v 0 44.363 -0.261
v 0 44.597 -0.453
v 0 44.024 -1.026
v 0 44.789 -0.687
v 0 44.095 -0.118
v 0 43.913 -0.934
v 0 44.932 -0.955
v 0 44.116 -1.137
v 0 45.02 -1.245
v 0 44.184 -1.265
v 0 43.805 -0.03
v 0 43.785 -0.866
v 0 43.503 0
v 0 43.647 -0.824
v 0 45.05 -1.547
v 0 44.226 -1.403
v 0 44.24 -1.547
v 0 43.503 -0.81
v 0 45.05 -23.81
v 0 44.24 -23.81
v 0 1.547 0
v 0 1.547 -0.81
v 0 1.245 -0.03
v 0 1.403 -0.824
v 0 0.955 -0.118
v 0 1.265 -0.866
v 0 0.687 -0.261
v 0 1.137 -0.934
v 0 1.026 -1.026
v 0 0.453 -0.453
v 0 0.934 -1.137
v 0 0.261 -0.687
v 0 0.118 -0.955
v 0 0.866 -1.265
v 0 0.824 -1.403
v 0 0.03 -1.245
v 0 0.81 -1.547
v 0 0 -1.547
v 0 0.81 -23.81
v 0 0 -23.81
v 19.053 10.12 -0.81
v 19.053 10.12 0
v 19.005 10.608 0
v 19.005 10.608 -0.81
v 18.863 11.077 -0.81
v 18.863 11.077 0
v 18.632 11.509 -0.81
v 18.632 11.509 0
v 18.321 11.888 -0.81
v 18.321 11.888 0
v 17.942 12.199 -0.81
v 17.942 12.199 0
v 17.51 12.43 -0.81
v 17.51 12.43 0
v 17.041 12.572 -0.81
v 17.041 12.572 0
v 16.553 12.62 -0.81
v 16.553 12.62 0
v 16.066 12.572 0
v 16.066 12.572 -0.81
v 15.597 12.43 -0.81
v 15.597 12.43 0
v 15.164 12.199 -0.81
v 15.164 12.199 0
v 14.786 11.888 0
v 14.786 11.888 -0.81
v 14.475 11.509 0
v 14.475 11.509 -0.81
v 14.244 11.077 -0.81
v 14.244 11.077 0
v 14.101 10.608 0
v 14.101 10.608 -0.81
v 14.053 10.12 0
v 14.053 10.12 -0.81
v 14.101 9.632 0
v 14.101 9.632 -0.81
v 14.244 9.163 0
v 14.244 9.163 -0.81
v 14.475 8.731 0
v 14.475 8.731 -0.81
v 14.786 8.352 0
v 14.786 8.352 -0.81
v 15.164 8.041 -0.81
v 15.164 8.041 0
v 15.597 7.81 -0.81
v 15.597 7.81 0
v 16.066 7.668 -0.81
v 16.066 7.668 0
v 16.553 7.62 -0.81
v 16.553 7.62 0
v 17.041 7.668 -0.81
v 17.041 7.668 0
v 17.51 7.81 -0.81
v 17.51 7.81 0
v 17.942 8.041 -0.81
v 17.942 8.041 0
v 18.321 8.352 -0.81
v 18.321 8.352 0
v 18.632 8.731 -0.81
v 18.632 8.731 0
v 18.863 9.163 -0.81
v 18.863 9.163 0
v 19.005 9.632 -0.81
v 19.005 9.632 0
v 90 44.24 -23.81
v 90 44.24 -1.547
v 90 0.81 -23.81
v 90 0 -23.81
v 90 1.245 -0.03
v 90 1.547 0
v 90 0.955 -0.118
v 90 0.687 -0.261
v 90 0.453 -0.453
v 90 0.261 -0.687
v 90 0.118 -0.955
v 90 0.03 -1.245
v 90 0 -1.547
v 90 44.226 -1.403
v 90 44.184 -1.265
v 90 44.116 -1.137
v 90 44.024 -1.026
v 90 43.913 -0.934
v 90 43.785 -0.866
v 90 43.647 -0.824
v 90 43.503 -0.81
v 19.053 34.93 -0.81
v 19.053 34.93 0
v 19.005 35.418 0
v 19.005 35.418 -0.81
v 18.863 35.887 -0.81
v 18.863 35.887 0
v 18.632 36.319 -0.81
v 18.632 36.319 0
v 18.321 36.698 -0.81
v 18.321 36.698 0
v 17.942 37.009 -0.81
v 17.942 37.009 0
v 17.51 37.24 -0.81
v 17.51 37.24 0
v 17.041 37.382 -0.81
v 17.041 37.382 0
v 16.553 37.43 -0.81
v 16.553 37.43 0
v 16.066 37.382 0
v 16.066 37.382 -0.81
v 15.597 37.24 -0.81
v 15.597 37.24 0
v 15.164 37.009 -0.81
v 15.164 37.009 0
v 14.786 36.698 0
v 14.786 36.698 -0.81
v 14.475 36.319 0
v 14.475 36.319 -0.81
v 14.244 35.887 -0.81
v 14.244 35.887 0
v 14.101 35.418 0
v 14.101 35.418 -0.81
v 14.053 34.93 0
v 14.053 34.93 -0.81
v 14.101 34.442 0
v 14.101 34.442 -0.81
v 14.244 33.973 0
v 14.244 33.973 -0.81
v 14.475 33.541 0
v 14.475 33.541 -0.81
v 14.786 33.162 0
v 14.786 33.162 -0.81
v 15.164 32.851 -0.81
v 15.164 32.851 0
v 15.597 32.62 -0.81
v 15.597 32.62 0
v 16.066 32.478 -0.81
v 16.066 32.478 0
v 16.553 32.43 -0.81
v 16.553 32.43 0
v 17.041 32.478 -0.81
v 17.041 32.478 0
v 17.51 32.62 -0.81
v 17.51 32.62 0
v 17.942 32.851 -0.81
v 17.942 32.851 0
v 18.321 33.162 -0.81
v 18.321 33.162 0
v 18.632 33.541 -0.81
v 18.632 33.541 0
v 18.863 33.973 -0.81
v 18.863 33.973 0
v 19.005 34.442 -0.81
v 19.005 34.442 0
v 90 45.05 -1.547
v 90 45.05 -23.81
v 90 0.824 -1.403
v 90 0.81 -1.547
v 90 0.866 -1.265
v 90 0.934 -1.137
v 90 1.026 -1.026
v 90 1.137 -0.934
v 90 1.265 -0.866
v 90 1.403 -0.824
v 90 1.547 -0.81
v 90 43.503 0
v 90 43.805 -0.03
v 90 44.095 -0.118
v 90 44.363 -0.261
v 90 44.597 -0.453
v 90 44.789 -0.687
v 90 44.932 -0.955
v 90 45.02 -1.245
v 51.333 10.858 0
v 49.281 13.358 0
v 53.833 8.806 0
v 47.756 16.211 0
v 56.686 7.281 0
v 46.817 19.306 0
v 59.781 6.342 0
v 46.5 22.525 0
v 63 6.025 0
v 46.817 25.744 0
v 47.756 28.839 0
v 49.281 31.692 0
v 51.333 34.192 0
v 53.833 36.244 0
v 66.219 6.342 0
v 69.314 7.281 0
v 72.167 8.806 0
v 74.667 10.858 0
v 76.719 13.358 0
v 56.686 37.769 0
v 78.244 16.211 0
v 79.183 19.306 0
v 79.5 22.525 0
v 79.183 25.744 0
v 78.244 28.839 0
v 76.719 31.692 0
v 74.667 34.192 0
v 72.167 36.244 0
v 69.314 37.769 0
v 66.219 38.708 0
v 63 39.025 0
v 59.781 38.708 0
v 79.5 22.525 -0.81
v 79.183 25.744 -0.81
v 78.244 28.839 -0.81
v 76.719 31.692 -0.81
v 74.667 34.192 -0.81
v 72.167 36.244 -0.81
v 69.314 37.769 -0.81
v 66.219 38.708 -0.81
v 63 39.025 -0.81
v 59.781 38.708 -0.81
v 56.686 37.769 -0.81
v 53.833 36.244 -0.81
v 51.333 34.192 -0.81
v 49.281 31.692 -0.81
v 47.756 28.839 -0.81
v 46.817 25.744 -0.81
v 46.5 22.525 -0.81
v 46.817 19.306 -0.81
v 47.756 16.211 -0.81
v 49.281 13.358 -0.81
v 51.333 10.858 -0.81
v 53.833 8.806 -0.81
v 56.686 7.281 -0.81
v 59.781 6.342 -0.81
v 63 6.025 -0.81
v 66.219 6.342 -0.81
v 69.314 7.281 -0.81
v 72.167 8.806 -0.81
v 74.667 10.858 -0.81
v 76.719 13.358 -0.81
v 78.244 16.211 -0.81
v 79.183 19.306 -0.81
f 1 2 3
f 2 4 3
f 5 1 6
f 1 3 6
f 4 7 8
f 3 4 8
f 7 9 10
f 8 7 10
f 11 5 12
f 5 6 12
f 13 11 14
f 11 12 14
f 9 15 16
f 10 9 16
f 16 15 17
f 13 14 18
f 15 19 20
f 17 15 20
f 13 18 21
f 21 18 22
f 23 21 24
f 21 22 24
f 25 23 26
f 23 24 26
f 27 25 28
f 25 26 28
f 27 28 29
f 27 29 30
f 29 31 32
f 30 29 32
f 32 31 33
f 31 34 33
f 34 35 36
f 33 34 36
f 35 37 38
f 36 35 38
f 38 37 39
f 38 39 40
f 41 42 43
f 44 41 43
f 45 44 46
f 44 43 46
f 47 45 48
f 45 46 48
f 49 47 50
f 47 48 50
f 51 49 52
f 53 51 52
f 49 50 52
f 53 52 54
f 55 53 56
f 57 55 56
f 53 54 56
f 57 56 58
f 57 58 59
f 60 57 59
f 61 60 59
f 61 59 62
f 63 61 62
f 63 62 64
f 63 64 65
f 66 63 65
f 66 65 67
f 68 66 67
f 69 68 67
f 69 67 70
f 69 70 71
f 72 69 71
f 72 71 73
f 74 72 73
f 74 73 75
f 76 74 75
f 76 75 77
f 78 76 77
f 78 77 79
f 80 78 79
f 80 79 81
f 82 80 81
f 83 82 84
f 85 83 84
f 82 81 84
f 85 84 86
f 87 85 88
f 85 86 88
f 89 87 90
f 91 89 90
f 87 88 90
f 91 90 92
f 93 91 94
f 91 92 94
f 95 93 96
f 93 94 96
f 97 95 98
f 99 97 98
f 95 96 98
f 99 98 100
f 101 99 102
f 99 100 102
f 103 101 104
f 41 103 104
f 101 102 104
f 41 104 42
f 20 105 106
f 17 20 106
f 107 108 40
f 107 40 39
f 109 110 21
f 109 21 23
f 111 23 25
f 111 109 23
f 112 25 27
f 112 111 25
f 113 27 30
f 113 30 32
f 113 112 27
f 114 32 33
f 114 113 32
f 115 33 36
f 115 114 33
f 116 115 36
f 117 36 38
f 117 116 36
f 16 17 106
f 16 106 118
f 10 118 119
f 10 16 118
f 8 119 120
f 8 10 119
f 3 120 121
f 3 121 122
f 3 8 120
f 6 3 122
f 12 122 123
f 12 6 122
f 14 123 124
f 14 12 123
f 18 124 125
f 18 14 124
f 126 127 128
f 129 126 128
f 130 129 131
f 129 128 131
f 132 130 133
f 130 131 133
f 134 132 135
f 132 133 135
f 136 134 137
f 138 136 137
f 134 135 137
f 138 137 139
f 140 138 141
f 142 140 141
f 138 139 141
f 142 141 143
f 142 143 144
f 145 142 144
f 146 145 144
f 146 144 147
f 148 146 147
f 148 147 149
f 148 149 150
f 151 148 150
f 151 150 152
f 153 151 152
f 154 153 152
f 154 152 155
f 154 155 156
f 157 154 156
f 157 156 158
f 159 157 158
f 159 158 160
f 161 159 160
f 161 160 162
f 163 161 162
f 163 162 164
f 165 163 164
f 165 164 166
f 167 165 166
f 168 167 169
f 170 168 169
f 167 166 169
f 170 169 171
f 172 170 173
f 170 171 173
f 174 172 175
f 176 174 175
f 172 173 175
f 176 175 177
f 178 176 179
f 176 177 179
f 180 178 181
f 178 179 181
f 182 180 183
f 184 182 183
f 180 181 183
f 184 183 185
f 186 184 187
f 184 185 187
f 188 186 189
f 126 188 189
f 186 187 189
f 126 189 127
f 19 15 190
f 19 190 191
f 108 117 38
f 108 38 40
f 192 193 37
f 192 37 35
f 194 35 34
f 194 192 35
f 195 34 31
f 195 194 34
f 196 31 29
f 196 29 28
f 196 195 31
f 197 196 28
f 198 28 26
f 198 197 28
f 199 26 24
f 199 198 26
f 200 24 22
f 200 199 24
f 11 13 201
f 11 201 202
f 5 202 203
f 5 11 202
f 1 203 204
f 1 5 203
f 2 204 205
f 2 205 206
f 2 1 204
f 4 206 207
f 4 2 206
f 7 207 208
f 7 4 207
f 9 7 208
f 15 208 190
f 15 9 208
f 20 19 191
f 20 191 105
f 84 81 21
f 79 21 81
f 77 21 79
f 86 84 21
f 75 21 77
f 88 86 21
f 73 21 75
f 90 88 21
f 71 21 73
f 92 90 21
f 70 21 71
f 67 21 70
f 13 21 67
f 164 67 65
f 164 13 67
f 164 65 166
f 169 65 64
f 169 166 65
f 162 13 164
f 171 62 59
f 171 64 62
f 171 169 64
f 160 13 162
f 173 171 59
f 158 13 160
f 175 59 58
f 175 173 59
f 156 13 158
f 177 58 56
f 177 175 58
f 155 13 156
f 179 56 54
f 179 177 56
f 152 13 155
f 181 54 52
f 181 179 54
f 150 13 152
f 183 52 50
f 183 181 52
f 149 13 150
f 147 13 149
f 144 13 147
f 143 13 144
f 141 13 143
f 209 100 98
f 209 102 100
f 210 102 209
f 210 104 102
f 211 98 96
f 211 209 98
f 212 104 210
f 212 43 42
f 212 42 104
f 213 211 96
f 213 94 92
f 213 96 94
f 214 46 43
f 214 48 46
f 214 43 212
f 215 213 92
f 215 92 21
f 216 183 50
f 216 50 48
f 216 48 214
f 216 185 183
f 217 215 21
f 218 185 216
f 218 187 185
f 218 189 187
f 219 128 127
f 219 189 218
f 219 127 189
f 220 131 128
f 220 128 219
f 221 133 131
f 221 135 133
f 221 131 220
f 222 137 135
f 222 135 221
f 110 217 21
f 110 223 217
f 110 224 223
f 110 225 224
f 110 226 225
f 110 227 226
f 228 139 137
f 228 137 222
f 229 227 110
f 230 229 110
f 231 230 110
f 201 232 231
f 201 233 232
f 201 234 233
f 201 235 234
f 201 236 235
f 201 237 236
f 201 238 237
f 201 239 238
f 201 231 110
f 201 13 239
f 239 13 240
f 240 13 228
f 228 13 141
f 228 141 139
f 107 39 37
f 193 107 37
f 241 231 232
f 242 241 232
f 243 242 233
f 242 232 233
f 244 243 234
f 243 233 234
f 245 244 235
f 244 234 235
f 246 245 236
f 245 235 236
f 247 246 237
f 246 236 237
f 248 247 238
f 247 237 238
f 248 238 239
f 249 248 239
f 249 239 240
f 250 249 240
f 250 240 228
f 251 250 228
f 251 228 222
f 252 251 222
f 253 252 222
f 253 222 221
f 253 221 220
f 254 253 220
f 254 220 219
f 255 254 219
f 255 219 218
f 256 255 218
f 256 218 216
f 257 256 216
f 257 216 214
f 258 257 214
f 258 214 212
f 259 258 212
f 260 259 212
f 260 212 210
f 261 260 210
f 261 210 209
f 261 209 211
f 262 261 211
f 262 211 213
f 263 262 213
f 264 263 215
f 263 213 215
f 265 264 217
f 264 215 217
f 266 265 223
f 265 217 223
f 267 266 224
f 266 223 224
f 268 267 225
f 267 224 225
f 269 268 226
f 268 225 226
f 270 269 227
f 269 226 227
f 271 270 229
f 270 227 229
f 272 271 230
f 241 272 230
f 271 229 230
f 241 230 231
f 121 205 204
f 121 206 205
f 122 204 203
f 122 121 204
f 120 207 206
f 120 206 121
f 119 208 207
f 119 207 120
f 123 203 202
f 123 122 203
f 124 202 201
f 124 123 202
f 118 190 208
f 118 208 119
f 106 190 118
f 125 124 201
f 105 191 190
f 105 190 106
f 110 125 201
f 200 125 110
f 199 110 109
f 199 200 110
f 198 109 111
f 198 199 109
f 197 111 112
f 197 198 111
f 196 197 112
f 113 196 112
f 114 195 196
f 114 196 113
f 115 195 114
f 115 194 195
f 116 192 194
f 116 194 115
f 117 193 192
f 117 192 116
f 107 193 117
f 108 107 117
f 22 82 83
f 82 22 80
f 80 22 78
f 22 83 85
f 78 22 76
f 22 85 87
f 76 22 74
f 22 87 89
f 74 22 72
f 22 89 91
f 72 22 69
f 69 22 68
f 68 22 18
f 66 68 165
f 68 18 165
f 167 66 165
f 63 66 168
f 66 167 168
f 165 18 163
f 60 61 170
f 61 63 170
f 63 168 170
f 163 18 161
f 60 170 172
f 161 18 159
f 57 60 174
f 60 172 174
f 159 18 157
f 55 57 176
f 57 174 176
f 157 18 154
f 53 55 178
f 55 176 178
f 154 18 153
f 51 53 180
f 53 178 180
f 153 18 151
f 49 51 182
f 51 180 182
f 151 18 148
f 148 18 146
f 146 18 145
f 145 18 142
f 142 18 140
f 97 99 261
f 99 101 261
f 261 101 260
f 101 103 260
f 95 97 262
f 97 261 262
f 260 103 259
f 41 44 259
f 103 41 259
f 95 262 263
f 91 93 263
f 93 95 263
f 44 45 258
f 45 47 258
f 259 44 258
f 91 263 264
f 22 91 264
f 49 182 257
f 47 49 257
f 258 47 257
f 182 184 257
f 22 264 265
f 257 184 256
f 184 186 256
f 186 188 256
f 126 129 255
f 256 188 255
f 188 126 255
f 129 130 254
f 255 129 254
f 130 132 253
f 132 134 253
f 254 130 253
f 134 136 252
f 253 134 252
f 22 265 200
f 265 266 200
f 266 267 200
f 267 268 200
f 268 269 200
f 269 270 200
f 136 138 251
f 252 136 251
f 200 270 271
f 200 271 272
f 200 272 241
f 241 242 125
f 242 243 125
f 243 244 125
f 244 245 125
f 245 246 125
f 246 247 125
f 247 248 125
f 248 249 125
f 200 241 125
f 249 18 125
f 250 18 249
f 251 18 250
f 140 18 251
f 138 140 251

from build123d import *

# Parameters (mm, degrees)
SKETCH1_W                    = 90
SKETCH1_H                    = 45.05
BASE_FLANGE1_DEPTH           = 0.81
EDGE_FLANGE1_STRIP_W         = 4.7132
EDGE_FLANGE1_STRIP_H         = 0.81
EDGE_FLANGE1_STRIP_CUT_DEPTH = 90
EDGE_FLANGE1_DEPTH           = 90
EDGE_FLANGE2_STRIP_W         = 4.7132
EDGE_FLANGE2_STRIP_H         = 0.81
EDGE_FLANGE2_STRIP_CUT_DEPTH = 90
EDGE_FLANGE2_DEPTH           = 90
SKETCH9_R                    = 16.5
SKETCH9_R_2                  = 2.5
CUT_EXTRUDE1_DEPTH           = 10


# Sheet-metal steps are written as plain solids
with BuildPart() as part:
    # Sketch1 → Base-Flange1 (new body)
    with BuildSketch(Plane.XY):
        with Locations((45, 22.525)):
            Rectangle(SKETCH1_W, SKETCH1_H)
    extrude(amount=-BASE_FLANGE1_DEPTH)

    # Edge-Flange1 strip (across the edge) → Edge-Flange1 strip cut (cut)
    with BuildSketch(Plane(origin=(0, 45.05, -0.81), x_dir=(0, -1, 0), z_dir=(1, 0, 0))):
        with Locations((-0.81, -0.405)):
            Rectangle(EDGE_FLANGE1_STRIP_W, EDGE_FLANGE1_STRIP_H)
    extrude(amount=EDGE_FLANGE1_STRIP_CUT_DEPTH, mode=Mode.SUBTRACT)

    # Edge-Flange1 section (across the edge) → Edge-Flange1 (add)
    with BuildSketch(Plane(origin=(0, 45.05, -0.81), x_dir=(0, -1, 0), z_dir=(1, 0, 0))):
        with BuildLine():
            Line((0, 0.7366), (0, 23))
            Line((0, 23), (0.81, 23))
            Line((0.81, 23), (0.81, 0.7366))
            ThreePointArc((0.81, 0.7366), (1.025745145, 0.215745145), (1.5466, 0))
            Line((1.5466, 0), (1.5466, -0.81))
            ThreePointArc((1.5466, -0.81), (0.452988652, -0.357011348), (0, 0.7366))
        make_face()
    extrude(amount=EDGE_FLANGE1_DEPTH)

    # Edge-Flange2 strip (across the edge) → Edge-Flange2 strip cut (cut)
    with BuildSketch(Plane(origin=(90, 0, -0.81), x_dir=(0, 1, 0), z_dir=(-1, 0, 0))):
        with Locations((-0.81, -0.405)):
            Rectangle(EDGE_FLANGE2_STRIP_W, EDGE_FLANGE2_STRIP_H)
    extrude(amount=EDGE_FLANGE2_STRIP_CUT_DEPTH, mode=Mode.SUBTRACT)

    # Edge-Flange2 section (across the edge) → Edge-Flange2 (add)
    with BuildSketch(Plane(origin=(90, 0, -0.81), x_dir=(0, 1, 0), z_dir=(-1, 0, 0))):
        with BuildLine():
            Line((0, 0.7366), (0, 23))
            Line((0, 23), (0.81, 23))
            Line((0.81, 23), (0.81, 0.7366))
            ThreePointArc((0.81, 0.7366), (1.025745145, 0.215745145), (1.5466, 0))
            Line((1.5466, 0), (1.5466, -0.81))
            ThreePointArc((1.5466, -0.81), (0.452988652, -0.357011348), (0, 0.7366))
        make_face()
    extrude(amount=EDGE_FLANGE2_DEPTH)

    # Sketch9 → Cut-Extrude1 (cut)
    with BuildSketch(Plane.XY):
        with Locations((63, 22.525)):
            Circle(SKETCH9_R)
        with Locations((16.55327865, 10.12)):
            Circle(SKETCH9_R_2)
        with Locations((16.55327865, 34.93)):
            Circle(SKETCH9_R_2)
    extrude(amount=-CUT_EXTRUDE1_DEPTH, mode=Mode.SUBTRACT)


solid = part.part
